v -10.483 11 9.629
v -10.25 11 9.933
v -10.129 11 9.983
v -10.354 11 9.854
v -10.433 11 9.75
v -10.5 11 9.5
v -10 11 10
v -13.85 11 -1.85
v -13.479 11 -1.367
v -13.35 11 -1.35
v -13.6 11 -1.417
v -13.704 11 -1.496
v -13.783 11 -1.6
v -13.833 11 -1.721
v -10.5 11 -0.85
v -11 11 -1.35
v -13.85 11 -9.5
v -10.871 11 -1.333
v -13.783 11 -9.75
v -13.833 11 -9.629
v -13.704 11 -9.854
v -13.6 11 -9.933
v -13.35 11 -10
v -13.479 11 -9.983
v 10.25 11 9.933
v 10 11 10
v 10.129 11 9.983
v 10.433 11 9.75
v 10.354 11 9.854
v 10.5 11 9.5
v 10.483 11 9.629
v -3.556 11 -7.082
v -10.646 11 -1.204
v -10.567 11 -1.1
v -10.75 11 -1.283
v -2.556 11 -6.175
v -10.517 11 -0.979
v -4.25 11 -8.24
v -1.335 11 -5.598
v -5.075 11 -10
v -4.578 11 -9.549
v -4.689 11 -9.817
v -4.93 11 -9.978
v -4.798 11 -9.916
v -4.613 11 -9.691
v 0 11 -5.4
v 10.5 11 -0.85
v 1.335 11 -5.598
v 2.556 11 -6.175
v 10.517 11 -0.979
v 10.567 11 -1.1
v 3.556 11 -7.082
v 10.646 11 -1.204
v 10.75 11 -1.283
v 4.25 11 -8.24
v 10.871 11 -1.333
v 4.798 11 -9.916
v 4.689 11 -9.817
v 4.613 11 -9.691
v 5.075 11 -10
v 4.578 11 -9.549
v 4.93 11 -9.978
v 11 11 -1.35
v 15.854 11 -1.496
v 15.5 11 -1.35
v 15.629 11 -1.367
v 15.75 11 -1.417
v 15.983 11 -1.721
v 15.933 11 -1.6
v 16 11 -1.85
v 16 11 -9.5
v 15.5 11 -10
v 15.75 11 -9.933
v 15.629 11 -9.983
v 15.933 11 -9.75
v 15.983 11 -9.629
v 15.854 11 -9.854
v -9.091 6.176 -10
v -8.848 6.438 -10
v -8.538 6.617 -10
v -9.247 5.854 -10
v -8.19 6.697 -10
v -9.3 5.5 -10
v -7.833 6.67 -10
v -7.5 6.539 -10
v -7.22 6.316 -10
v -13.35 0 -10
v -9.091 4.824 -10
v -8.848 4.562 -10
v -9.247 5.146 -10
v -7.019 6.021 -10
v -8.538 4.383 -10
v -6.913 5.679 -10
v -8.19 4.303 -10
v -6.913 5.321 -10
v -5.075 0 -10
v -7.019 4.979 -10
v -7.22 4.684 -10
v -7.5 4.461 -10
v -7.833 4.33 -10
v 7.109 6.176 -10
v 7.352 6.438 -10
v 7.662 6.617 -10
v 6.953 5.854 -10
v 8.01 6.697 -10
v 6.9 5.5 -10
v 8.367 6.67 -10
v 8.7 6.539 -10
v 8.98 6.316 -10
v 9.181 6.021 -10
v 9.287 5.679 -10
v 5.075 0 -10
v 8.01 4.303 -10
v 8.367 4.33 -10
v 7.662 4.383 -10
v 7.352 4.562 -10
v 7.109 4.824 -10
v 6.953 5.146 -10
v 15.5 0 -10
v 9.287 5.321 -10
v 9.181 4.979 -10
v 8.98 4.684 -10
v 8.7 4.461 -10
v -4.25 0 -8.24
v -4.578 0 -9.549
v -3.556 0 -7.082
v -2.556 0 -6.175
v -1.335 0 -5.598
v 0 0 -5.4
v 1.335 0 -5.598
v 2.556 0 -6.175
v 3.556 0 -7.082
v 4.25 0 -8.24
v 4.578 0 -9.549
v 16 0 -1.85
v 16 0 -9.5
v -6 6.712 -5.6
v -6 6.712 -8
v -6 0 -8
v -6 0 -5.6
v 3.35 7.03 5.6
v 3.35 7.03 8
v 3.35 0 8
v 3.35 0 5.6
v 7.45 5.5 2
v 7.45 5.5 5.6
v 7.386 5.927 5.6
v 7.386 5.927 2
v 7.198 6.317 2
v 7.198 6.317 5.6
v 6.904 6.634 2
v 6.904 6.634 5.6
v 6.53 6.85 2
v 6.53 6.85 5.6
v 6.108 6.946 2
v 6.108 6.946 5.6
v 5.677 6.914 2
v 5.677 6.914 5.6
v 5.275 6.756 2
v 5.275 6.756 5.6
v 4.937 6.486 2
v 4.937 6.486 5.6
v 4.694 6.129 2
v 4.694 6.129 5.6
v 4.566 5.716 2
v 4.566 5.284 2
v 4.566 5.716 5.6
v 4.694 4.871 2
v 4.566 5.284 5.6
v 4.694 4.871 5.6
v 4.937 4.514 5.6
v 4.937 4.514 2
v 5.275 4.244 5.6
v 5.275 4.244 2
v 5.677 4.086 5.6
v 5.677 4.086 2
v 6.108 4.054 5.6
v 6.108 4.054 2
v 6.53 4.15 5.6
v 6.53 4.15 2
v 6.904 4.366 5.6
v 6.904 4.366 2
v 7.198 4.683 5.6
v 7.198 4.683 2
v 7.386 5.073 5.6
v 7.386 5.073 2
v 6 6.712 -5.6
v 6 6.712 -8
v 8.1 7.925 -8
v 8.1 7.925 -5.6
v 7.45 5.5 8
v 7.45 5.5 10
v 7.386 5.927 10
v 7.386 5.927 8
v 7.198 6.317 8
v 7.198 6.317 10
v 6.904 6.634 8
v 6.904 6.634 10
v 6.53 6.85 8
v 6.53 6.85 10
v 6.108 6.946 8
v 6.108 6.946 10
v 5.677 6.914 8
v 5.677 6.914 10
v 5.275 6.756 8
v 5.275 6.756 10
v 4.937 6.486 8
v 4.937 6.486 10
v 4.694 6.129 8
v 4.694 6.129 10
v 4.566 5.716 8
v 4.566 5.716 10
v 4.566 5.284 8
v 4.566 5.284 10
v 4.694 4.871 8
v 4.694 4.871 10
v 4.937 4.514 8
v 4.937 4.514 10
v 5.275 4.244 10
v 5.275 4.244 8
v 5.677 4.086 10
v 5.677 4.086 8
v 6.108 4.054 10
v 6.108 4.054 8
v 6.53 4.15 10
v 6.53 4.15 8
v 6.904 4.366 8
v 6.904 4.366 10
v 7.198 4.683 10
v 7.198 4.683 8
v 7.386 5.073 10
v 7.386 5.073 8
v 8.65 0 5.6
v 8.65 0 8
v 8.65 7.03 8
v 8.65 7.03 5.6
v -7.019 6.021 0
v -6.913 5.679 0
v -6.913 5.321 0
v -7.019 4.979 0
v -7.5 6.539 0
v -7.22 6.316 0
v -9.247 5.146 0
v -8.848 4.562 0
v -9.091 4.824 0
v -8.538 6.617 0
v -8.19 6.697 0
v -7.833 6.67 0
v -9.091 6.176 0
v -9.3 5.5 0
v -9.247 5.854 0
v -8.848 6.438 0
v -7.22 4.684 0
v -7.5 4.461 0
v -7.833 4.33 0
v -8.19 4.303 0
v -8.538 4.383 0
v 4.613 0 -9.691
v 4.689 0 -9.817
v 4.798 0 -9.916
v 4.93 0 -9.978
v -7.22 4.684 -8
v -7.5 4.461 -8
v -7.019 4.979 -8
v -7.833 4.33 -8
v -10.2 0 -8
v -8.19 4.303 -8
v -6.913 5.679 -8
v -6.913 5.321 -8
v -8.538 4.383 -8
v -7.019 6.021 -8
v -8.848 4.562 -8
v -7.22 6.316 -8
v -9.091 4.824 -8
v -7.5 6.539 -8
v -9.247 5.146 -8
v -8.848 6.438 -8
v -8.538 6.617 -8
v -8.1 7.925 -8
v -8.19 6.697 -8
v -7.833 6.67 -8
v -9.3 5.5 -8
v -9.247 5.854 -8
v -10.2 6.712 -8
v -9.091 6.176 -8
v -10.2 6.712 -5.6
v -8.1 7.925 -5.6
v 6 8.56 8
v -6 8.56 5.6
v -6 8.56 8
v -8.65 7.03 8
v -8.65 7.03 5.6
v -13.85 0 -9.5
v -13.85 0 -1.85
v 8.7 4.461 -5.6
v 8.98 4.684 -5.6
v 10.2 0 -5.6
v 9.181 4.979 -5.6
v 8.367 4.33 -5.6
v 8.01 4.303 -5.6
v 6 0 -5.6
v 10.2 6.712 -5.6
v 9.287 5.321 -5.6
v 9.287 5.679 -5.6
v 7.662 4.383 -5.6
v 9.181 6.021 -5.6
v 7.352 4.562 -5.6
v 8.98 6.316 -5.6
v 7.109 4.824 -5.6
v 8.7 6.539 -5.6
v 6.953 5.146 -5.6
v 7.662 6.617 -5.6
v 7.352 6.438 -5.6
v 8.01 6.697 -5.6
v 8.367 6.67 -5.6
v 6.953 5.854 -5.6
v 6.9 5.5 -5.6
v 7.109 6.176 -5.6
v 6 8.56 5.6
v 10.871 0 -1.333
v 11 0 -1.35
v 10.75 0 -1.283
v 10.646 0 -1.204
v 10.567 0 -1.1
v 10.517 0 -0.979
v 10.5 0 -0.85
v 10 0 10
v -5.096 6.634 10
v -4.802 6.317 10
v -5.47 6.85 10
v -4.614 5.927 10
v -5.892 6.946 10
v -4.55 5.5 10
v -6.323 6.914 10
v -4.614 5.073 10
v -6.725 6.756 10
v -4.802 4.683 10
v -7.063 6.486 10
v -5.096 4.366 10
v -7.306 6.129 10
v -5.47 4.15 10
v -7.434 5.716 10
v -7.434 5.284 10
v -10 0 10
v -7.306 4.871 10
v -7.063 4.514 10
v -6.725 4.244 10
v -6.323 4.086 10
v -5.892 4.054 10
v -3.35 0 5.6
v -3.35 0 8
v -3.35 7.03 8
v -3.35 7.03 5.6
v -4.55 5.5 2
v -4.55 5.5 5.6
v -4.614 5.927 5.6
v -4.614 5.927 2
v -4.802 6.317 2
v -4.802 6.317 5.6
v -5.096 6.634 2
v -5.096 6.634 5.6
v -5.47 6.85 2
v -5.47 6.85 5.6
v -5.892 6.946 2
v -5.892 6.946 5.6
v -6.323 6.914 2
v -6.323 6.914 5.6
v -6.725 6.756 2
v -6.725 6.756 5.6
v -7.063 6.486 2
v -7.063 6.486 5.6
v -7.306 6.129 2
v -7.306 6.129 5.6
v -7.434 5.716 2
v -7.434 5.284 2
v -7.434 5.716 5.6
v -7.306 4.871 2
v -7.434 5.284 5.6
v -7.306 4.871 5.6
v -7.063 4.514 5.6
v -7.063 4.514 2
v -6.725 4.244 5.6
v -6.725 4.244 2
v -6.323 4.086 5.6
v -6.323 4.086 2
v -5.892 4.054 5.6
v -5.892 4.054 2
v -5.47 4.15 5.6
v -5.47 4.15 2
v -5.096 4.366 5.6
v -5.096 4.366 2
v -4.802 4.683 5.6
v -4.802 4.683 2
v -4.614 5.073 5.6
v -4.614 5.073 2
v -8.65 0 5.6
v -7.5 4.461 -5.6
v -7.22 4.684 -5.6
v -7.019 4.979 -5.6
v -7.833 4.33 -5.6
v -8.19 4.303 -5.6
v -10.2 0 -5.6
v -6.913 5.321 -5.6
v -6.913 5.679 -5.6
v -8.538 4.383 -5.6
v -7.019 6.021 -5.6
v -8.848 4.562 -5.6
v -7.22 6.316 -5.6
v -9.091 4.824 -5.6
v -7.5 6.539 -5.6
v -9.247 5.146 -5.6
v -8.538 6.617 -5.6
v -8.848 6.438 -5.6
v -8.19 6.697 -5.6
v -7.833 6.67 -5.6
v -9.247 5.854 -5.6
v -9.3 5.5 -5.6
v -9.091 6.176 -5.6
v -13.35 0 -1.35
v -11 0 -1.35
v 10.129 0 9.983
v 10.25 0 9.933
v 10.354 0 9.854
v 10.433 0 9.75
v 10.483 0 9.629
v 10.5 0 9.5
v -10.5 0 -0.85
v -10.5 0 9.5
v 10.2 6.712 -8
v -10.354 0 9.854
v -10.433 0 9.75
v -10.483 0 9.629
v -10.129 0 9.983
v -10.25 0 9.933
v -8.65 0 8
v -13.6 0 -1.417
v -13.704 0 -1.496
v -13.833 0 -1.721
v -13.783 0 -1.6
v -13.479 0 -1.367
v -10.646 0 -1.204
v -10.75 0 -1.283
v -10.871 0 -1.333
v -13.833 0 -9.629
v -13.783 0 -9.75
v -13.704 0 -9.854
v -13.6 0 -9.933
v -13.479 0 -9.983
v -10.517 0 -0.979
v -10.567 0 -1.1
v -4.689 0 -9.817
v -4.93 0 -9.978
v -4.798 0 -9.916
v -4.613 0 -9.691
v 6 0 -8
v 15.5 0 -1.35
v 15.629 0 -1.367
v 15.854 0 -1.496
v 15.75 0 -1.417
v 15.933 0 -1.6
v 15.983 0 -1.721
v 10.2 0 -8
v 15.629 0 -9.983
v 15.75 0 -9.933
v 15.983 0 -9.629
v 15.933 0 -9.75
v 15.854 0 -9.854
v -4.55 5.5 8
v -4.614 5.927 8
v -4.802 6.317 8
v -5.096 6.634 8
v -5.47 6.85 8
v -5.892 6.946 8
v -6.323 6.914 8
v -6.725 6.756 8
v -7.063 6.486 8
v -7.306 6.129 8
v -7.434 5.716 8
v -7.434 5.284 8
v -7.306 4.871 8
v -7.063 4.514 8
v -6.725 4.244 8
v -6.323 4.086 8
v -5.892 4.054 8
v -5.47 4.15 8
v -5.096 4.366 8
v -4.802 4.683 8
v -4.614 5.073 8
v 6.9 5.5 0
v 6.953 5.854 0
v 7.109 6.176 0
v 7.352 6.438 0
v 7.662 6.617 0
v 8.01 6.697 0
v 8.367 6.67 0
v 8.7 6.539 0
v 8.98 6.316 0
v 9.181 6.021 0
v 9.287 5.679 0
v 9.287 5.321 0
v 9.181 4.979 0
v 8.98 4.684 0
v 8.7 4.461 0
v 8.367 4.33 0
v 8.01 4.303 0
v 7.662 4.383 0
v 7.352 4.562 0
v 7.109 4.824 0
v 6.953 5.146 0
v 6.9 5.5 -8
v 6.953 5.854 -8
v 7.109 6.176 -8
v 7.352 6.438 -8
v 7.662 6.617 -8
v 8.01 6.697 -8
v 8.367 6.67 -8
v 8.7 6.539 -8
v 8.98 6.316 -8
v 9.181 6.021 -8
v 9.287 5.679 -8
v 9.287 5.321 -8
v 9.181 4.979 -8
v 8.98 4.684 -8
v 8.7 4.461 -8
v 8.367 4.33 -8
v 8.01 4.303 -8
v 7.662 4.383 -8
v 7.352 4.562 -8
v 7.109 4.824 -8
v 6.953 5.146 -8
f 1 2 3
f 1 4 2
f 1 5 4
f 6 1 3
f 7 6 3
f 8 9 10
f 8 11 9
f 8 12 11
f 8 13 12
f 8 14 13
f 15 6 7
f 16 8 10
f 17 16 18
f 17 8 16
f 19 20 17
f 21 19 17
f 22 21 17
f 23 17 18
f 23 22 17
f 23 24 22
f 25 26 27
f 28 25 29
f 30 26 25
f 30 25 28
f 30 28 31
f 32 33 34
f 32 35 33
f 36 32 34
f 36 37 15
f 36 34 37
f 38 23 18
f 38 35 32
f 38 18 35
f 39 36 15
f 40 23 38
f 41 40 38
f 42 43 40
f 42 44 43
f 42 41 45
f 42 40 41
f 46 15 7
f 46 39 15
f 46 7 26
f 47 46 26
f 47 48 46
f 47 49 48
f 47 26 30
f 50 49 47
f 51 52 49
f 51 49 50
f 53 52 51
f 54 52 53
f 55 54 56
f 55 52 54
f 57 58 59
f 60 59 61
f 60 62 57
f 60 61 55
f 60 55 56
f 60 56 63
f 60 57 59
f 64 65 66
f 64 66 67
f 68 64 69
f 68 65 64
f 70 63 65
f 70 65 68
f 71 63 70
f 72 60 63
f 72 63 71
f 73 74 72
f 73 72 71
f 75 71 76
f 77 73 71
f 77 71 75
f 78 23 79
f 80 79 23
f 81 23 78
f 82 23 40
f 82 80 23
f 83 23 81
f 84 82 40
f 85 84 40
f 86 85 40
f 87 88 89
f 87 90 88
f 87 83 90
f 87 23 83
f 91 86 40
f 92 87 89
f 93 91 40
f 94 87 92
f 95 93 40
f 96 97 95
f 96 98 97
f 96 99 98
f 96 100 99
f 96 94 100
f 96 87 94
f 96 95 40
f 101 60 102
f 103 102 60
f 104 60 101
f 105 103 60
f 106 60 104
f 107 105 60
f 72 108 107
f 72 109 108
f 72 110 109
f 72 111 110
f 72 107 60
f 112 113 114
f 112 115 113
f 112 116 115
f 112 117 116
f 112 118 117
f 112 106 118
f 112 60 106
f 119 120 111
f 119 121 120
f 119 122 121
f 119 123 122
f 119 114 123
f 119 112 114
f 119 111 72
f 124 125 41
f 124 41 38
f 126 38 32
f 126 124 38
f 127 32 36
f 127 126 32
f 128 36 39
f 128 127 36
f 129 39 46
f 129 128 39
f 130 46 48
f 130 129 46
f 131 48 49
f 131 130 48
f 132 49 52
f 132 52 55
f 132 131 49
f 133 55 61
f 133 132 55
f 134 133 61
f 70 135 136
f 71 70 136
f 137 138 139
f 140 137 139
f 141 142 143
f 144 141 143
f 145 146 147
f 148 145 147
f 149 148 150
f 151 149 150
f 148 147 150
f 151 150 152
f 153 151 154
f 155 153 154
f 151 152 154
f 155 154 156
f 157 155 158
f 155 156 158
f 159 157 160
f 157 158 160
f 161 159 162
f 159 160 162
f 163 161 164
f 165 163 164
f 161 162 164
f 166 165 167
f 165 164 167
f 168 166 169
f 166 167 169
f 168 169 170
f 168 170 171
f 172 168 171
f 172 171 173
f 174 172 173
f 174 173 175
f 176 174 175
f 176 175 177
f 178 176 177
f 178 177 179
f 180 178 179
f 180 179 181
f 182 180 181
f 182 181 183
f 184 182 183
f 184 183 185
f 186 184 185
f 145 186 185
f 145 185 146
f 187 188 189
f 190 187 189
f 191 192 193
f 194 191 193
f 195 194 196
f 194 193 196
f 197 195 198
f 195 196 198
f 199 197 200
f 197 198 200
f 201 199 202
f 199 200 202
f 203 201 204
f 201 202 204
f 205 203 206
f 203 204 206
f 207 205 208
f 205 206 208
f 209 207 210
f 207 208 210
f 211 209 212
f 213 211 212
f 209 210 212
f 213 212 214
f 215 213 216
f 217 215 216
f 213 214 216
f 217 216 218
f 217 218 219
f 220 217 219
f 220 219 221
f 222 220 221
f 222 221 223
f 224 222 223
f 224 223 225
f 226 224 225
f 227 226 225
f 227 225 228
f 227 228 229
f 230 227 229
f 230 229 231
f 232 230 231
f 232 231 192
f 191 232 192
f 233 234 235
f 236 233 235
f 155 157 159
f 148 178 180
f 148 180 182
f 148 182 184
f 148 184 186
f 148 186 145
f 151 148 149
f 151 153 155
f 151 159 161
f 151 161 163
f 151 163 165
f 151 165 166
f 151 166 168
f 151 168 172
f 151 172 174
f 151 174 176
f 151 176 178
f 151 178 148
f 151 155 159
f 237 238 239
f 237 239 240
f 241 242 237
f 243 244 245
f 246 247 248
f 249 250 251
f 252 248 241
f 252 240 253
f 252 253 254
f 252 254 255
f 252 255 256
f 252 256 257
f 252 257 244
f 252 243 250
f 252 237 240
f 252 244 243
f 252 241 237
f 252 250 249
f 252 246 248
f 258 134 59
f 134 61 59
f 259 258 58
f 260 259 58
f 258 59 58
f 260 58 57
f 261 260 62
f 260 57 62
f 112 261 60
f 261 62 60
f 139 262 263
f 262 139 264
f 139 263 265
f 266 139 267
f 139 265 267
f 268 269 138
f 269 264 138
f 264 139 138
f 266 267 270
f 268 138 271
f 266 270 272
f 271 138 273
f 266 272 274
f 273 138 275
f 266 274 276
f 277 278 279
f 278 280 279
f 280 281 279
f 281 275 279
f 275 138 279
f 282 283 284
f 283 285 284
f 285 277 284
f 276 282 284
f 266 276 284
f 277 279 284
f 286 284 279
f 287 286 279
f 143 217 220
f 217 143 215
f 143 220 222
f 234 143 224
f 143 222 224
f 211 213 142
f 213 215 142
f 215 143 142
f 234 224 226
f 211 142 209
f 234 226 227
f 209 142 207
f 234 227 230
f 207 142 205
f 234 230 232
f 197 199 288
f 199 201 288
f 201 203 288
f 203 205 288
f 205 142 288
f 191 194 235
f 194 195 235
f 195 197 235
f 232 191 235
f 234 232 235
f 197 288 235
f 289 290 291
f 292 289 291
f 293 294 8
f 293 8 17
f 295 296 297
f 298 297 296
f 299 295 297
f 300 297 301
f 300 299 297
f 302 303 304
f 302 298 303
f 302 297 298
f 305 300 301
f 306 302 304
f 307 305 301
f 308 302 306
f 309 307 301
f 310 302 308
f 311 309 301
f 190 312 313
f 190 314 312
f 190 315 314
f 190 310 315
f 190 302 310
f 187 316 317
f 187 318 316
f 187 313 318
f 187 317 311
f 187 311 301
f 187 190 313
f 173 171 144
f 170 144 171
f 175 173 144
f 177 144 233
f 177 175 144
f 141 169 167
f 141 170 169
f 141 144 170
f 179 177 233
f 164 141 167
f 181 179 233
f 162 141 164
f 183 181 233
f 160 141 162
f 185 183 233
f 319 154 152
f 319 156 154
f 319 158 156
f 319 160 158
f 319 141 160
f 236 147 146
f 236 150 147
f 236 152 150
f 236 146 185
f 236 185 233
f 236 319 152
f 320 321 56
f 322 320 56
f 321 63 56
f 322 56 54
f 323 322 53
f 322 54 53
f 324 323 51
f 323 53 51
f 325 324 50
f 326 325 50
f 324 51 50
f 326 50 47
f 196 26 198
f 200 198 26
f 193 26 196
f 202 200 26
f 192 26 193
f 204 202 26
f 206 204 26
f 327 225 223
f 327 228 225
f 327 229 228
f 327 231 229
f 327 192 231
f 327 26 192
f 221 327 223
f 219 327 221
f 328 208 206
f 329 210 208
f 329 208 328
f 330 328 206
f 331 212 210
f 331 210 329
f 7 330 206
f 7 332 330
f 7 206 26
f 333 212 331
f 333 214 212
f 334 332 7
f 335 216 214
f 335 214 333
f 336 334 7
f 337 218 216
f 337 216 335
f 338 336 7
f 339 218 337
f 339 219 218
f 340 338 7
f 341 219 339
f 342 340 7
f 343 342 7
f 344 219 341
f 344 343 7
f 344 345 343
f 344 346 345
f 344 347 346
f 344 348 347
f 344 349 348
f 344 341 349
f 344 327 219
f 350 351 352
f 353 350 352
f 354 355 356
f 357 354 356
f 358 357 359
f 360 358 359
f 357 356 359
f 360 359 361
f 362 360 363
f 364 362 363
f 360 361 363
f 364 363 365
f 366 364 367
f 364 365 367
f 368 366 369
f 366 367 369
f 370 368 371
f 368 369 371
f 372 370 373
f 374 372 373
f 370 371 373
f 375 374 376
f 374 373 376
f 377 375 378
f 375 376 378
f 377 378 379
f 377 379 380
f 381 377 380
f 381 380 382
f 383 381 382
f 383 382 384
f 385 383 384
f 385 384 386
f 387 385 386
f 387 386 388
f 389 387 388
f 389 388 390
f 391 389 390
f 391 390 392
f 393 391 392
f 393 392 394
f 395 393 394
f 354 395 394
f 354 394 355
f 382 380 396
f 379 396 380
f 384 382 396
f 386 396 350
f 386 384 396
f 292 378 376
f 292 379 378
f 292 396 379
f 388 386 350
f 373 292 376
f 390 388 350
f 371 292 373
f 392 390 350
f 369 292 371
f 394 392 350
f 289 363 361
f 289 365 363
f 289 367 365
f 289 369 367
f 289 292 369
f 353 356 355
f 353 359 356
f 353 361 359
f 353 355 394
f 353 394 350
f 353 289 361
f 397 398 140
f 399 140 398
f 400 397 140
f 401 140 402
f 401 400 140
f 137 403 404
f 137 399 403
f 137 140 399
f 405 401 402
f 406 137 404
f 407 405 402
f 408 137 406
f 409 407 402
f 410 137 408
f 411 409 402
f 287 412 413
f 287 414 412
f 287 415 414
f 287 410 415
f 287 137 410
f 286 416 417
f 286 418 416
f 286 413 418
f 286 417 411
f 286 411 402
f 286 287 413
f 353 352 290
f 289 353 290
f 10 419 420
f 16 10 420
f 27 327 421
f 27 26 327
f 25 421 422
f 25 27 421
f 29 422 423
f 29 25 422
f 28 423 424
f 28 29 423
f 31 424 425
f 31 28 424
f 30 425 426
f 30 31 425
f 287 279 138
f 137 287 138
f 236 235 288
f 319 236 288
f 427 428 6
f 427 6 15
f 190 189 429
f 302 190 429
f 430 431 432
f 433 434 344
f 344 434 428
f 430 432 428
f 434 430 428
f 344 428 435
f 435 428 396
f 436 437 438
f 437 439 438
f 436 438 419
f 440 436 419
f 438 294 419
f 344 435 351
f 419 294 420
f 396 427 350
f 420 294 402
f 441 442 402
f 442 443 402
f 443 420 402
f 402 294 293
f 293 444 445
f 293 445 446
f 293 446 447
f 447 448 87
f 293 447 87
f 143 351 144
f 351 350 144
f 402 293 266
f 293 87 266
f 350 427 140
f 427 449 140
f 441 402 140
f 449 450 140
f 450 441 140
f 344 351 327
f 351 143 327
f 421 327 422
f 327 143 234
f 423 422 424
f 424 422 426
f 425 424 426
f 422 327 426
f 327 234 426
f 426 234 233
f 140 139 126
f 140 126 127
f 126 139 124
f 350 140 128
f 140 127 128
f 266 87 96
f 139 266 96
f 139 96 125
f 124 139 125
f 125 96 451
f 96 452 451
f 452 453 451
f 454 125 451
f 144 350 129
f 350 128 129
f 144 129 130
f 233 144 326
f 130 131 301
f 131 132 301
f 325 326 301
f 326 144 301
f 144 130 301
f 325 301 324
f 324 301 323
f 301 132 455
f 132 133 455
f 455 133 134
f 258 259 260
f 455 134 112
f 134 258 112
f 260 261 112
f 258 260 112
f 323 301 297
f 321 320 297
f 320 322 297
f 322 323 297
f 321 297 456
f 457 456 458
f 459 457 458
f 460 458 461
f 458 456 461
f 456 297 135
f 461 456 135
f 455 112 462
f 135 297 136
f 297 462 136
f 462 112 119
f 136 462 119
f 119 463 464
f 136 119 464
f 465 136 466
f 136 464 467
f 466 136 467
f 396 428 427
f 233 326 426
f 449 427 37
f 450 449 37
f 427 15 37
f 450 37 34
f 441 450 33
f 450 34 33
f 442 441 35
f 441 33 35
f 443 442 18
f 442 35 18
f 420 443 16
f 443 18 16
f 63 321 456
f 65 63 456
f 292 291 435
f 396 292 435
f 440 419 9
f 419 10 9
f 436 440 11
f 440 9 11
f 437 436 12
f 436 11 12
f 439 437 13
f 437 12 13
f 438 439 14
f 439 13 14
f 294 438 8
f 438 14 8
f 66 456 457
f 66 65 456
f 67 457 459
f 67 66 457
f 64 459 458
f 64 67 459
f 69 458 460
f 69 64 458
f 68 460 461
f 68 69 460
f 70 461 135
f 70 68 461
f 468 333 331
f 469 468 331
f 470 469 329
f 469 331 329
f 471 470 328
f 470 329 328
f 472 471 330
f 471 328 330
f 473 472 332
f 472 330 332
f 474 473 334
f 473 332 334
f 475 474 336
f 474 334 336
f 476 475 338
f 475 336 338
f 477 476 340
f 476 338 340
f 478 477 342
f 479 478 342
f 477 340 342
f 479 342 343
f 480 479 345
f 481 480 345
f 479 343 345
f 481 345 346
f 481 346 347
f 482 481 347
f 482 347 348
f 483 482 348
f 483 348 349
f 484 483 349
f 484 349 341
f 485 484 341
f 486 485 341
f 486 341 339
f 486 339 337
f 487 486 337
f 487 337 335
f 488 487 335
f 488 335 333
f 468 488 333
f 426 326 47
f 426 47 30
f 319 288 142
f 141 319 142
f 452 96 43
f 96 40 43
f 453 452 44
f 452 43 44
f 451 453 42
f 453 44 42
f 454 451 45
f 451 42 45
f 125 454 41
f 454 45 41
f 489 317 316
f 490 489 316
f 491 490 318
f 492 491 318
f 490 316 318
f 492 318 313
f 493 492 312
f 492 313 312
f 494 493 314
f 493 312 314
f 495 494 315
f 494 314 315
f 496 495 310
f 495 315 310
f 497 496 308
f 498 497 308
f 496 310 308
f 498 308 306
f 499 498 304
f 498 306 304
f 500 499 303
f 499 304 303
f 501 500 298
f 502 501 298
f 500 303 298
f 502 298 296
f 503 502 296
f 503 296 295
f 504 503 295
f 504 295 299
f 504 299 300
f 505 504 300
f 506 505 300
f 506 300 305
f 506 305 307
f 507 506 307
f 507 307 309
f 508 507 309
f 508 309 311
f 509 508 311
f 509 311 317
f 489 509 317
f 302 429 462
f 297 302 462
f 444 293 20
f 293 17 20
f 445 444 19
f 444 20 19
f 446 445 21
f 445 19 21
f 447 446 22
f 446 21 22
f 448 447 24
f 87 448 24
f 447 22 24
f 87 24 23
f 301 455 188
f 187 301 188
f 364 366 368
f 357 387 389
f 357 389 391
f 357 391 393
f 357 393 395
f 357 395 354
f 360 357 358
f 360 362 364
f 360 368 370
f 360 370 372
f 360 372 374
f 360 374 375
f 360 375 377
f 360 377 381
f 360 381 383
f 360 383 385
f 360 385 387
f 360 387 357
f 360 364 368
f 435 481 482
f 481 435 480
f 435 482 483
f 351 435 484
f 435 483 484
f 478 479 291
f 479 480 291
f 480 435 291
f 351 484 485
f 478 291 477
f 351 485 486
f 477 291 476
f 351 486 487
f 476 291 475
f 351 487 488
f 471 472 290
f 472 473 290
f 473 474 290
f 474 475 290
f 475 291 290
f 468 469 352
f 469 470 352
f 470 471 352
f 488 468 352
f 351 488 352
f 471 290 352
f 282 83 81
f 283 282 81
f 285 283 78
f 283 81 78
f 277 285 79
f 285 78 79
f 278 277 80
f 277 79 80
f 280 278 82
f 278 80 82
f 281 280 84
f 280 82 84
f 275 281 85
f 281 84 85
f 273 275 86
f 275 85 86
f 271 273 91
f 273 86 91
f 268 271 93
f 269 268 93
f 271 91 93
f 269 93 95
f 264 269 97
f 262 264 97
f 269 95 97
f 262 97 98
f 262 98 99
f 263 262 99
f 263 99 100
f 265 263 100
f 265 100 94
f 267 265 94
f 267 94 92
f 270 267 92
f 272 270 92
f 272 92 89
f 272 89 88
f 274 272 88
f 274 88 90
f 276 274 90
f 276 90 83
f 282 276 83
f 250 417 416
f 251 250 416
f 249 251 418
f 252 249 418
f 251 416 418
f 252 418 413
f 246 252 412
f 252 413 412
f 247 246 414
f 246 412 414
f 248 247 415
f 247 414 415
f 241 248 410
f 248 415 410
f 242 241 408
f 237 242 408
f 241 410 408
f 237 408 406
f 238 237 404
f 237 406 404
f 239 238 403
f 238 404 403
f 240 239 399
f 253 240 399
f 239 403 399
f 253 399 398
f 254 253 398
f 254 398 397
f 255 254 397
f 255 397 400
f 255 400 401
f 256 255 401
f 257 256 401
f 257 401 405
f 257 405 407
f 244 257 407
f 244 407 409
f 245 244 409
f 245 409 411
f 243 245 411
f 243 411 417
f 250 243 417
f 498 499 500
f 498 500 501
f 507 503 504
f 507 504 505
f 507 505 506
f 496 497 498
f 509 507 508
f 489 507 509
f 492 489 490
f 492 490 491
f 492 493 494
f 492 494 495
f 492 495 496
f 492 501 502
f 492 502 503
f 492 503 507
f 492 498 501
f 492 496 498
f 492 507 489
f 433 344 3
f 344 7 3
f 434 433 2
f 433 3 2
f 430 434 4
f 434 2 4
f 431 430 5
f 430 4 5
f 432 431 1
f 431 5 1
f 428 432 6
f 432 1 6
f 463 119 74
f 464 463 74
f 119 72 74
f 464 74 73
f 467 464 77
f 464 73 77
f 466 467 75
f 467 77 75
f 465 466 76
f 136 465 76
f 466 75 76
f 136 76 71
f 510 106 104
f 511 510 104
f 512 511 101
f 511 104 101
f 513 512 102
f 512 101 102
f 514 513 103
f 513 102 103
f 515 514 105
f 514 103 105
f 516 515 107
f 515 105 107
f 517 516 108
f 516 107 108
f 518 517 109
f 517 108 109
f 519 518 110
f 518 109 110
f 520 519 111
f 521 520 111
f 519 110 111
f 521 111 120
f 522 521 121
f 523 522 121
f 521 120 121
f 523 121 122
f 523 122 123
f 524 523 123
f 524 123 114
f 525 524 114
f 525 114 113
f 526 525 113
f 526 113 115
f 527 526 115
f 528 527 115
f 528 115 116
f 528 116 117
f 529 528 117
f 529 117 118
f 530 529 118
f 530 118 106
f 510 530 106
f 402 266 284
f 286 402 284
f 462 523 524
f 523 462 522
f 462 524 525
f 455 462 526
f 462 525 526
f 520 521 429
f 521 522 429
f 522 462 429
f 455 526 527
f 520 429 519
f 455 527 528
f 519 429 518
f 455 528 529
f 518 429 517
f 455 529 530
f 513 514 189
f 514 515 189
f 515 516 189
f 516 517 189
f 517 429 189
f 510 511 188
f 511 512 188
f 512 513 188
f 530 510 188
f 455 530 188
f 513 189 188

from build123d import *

# Parameters (mm, degrees)
BOSS_EXTRUDE1_DEPTH = 11
SKETCH2_R           = 1.45
CUT_EXTRUDE1_DEPTH  = 8
SKETCH3_R           = 1.2
CUT_EXTRUDE2_DEPTH  = 10
CUT_EXTRUDE3_START  = -2
SKETCH5_R           = 1.2
CUT_EXTRUDE3_DEPTH  = 2.4
CUT_EXTRUDE4_START  = -2
CUT_EXTRUDE4_DEPTH  = 2.4
SKETCH1_4_W         = 5.5
SKETCH1_4_H         = 8.65
SKETCH1_4_W_2       = 3.35
BOSS_EXTRUDE2_DEPTH = 11
FILLET2_R           = 0.5


with BuildPart() as part:
    # Sketch1 → Boss-Extrude1 (new body)
    with BuildSketch(Plane(origin=(0, 0, 0), x_dir=(1, 0, 0), z_dir=(0, 1, 0))):
        with BuildLine():
            ThreePointArc((-4.6, 10), (0, 5.4), (4.6, 10))
            Line((4.6, 10), (10.5, 10))
            Line((10.5, 10), (10.5, -10))
            Line((10.5, -10), (-10.5, -10))
            Line((-10.5, -10), (-10.5, 10))
            Line((-10.5, 10), (-4.6, 10))
        make_face()
    extrude(amount=BOSS_EXTRUDE1_DEPTH)

    # Sketch2 → Cut-Extrude1 (cut)
    with BuildSketch(Plane.XY.offset(10)):
        with Locations((-6, 5.5)):
            Circle(SKETCH2_R)
        with Locations((6, 5.5)):
            Circle(SKETCH2_R)
    extrude(amount=-CUT_EXTRUDE1_DEPTH, mode=Mode.SUBTRACT)

    # Sketch3 → Cut-Extrude2 (cut)
    with BuildSketch(Plane(origin=(0, 0, -10), x_dir=(-1, 0, 0), z_dir=(0, 0, -1))):
        with Locations((-8.1, 5.5)):
            Circle(SKETCH3_R)
        with Locations((8.1, 5.5)):
            Circle(SKETCH3_R)
    extrude(amount=-CUT_EXTRUDE2_DEPTH, mode=Mode.SUBTRACT)

    # Sketch5 → Cut-Extrude3 (cut)
    # profile 1 of 2: a face of its own
    with BuildSketch(Plane(origin=(0, 0, -10), x_dir=(-1, 0, 0), z_dir=(0, 0, -1)).offset(CUT_EXTRUDE3_START)):
        Polygon((-6, 0), (-6, 4.287564435), (-6, 6.712435565), (-8.1, 7.924871131), (-10.2, 6.712435565), (-10.2, 4.287564435), (-10.2, 0), align=None)
        with Locations((-8.1, 5.5)):
            Circle(SKETCH5_R, mode=Mode.SUBTRACT)
    # profile 2 of 2: a face of its own
    with BuildSketch(Plane(origin=(0, 0, -10), x_dir=(-1, 0, 0), z_dir=(0, 0, -1)).offset(CUT_EXTRUDE3_START)):
        Polygon((6, 0), (10.2, 0), (10.2, 4.287564435), (10.2, 6.712435565), (8.1, 7.924871131), (6, 6.712435565), (6, 4.287564435), align=None)
    extrude(amount=-CUT_EXTRUDE3_DEPTH, mode=Mode.SUBTRACT)

    # Sketch6 → Cut-Extrude4 (cut)
    with BuildSketch(Plane.XY.offset(10).offset(CUT_EXTRUDE4_START)):
        Polygon((-6, 8.559956427), (-8.65, 7.029978213), (-8.65, 3.970021787), (-8.65, 0), (-3.35, 0), (-3.35, 3.970021787), (-3.35, 7.029978213), align=None)
        Polygon((6, 8.559956427), (3.35, 7.029978213), (3.35, 3.970021787), (3.35, 0), (8.65, 0), (8.65, 3.970021787), (8.65, 7.029978213), align=None)
    extrude(amount=-CUT_EXTRUDE4_DEPTH, mode=Mode.SUBTRACT)

    # Sketch1<4> → Boss-Extrude2 (add, through all)
    with BuildSketch(Plane(origin=(0, 0, 0), x_dir=(1, 0, 0), z_dir=(0, 1, 0))):
        with Locations((13.25, 5.675)):
            Rectangle(SKETCH1_4_W, SKETCH1_4_H)
        with Locations((-12.175, 5.675)):
            Rectangle(SKETCH1_4_W_2, SKETCH1_4_H)
    extrude(amount=BOSS_EXTRUDE2_DEPTH)

    # Fillet2
    fillet2_edges = [part.edges().sort_by_distance(p)[0] for p in [
        (10.5, 5.5, -1.35),
        (16, 5.5, -1.35),
        (16, 5.5, -10),
        (4.6, 5.5, -10),
        (10.5, 5.5, 10),
        (-10.5, 5.5, 10),
        (-4.6, 5.5, -10),
        (-13.85, 5.5, -10),
        (-13.85, 5.5, -1.35),
        (-10.5, 5.5, -1.35),
    ]]
    fillet(fillet2_edges, radius=FILLET2_R)


solid = part.part
